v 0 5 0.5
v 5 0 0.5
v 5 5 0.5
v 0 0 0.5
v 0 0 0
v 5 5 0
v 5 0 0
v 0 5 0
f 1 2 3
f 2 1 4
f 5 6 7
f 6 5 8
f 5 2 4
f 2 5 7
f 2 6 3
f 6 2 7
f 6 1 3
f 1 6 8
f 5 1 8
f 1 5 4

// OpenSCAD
// file: lib.scad
LIBCONST = 5;
module part(h) cube([LIBCONST, LIBCONST, h]);
// main file
include <lib.scad>
/* [Box] */
width = 10;  // [1:100]
height = 20;
ratio = width / height;

part(ratio);
